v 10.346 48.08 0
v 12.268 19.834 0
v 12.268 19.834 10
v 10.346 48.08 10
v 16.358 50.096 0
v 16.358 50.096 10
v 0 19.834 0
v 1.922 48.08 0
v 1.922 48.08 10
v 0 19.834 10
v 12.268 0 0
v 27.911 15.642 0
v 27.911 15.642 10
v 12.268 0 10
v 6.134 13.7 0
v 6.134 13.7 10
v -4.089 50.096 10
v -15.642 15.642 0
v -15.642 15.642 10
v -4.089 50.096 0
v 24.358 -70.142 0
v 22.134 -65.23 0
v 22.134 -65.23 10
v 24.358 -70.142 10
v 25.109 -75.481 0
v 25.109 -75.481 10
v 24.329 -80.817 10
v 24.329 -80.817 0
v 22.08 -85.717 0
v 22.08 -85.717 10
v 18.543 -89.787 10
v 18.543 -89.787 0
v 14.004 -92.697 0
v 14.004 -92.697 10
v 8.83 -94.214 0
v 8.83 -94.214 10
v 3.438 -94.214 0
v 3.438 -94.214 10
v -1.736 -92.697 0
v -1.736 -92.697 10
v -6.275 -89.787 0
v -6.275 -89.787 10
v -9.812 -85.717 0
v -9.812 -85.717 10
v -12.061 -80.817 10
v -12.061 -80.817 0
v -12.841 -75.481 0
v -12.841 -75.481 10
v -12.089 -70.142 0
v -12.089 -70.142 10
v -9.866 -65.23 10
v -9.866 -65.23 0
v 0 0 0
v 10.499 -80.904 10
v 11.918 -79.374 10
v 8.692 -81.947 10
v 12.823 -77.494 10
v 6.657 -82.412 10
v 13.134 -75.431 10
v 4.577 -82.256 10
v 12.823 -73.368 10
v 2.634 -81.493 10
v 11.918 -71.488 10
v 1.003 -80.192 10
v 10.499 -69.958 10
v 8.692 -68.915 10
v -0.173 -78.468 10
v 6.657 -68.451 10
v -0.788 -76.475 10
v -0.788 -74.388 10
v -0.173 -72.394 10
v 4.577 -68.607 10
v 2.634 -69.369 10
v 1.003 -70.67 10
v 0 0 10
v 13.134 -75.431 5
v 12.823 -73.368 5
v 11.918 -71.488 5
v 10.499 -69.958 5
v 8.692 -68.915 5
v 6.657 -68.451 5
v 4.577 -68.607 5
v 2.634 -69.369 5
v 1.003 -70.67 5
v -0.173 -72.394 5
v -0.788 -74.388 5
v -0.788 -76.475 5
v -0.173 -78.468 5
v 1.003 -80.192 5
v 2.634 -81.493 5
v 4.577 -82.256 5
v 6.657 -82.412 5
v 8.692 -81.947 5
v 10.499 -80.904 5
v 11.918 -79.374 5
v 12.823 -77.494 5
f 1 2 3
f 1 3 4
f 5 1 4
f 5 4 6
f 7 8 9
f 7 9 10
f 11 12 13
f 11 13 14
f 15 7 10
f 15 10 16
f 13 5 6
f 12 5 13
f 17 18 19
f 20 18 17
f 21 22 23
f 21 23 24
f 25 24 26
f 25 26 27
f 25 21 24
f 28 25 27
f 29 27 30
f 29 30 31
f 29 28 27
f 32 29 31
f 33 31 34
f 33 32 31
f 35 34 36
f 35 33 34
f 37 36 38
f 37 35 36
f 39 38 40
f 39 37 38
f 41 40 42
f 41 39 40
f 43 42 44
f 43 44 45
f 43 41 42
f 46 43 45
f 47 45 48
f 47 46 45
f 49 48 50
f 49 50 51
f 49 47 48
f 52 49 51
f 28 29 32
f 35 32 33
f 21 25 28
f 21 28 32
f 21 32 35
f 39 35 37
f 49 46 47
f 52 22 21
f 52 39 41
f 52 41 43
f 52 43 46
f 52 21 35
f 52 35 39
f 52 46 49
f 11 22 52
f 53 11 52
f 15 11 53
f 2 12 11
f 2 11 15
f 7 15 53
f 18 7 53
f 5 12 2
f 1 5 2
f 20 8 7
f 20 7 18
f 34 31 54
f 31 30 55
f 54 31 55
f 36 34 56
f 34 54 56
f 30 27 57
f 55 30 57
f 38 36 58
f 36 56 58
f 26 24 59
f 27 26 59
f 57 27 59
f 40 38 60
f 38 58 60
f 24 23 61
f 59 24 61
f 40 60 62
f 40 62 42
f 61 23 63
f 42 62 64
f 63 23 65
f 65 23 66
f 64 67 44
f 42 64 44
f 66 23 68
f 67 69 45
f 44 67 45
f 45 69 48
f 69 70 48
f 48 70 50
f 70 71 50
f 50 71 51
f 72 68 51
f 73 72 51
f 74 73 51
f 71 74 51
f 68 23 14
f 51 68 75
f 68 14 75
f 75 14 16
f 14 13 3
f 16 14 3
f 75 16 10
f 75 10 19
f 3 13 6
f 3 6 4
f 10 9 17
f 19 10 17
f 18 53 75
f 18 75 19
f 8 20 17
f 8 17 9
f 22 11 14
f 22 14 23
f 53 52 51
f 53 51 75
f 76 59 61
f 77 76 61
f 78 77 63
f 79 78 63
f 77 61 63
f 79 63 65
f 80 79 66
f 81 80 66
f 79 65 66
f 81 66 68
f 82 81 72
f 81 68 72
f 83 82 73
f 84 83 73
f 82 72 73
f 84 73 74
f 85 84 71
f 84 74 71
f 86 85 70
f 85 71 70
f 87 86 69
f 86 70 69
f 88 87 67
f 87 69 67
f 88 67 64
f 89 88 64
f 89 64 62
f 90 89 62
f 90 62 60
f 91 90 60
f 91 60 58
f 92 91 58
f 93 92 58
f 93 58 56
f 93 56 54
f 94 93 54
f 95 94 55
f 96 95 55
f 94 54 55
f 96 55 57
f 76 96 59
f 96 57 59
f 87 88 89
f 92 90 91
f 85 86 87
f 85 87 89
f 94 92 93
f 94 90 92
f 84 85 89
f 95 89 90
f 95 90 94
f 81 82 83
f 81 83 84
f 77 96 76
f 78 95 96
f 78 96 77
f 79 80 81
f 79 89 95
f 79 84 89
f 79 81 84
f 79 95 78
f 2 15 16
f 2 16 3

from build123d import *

# Parameters (mm, degrees)
BOSS_EXTRUDE1_DEPTH = 10
SKETCH2_R           = 7
CUT_EXTRUDE1_DEPTH  = 5


with BuildPart() as part:
    # Sketch1 → Boss-Extrude1 (new body)
    with BuildSketch(Plane.XY):
        with BuildLine():
            Line((0, 0), (-15.642172524, 15.642172524))
            Line((-15.642172524, 15.642172524), (-4.089456869, 50.095846645))
            Line((-4.089456869, 50.095846645), (1.922169026, 48.080078912))
            Line((1.922169026, 48.080078912), (0, 19.833865815))
            Line((0, 19.833865815), (6.134185304, 13.699680511))
            Line((6.134185304, 13.699680511), (12.268370607, 19.833865815))
            Line((12.268370607, 19.833865815), (10.346201581, 48.080078912))
            Line((10.346201581, 48.080078912), (16.357827476, 50.095846645))
            Line((16.357827476, 50.095846645), (27.910543131, 15.642172524))
            Line((27.910543131, 15.642172524), (12.268370607, 0))
            Line((12.268370607, 0), (22.134185304, -65.230001967))
            ThreePointArc((22.134185304, -65.230001967), (6.134185304, -94.406570423), (-9.865814696, -65.230001967))
            Line((-9.865814696, -65.230001967), (0, 0))
        make_face()
    extrude(amount=BOSS_EXTRUDE1_DEPTH)

    # Sketch2 → Cut-Extrude1 (cut)
    with BuildSketch(Plane.XY.offset(10)):
        with Locations((6.134185304, -75.431204137)):
            Circle(SKETCH2_R)
    extrude(amount=-CUT_EXTRUDE1_DEPTH, mode=Mode.SUBTRACT)


solid = part.part
